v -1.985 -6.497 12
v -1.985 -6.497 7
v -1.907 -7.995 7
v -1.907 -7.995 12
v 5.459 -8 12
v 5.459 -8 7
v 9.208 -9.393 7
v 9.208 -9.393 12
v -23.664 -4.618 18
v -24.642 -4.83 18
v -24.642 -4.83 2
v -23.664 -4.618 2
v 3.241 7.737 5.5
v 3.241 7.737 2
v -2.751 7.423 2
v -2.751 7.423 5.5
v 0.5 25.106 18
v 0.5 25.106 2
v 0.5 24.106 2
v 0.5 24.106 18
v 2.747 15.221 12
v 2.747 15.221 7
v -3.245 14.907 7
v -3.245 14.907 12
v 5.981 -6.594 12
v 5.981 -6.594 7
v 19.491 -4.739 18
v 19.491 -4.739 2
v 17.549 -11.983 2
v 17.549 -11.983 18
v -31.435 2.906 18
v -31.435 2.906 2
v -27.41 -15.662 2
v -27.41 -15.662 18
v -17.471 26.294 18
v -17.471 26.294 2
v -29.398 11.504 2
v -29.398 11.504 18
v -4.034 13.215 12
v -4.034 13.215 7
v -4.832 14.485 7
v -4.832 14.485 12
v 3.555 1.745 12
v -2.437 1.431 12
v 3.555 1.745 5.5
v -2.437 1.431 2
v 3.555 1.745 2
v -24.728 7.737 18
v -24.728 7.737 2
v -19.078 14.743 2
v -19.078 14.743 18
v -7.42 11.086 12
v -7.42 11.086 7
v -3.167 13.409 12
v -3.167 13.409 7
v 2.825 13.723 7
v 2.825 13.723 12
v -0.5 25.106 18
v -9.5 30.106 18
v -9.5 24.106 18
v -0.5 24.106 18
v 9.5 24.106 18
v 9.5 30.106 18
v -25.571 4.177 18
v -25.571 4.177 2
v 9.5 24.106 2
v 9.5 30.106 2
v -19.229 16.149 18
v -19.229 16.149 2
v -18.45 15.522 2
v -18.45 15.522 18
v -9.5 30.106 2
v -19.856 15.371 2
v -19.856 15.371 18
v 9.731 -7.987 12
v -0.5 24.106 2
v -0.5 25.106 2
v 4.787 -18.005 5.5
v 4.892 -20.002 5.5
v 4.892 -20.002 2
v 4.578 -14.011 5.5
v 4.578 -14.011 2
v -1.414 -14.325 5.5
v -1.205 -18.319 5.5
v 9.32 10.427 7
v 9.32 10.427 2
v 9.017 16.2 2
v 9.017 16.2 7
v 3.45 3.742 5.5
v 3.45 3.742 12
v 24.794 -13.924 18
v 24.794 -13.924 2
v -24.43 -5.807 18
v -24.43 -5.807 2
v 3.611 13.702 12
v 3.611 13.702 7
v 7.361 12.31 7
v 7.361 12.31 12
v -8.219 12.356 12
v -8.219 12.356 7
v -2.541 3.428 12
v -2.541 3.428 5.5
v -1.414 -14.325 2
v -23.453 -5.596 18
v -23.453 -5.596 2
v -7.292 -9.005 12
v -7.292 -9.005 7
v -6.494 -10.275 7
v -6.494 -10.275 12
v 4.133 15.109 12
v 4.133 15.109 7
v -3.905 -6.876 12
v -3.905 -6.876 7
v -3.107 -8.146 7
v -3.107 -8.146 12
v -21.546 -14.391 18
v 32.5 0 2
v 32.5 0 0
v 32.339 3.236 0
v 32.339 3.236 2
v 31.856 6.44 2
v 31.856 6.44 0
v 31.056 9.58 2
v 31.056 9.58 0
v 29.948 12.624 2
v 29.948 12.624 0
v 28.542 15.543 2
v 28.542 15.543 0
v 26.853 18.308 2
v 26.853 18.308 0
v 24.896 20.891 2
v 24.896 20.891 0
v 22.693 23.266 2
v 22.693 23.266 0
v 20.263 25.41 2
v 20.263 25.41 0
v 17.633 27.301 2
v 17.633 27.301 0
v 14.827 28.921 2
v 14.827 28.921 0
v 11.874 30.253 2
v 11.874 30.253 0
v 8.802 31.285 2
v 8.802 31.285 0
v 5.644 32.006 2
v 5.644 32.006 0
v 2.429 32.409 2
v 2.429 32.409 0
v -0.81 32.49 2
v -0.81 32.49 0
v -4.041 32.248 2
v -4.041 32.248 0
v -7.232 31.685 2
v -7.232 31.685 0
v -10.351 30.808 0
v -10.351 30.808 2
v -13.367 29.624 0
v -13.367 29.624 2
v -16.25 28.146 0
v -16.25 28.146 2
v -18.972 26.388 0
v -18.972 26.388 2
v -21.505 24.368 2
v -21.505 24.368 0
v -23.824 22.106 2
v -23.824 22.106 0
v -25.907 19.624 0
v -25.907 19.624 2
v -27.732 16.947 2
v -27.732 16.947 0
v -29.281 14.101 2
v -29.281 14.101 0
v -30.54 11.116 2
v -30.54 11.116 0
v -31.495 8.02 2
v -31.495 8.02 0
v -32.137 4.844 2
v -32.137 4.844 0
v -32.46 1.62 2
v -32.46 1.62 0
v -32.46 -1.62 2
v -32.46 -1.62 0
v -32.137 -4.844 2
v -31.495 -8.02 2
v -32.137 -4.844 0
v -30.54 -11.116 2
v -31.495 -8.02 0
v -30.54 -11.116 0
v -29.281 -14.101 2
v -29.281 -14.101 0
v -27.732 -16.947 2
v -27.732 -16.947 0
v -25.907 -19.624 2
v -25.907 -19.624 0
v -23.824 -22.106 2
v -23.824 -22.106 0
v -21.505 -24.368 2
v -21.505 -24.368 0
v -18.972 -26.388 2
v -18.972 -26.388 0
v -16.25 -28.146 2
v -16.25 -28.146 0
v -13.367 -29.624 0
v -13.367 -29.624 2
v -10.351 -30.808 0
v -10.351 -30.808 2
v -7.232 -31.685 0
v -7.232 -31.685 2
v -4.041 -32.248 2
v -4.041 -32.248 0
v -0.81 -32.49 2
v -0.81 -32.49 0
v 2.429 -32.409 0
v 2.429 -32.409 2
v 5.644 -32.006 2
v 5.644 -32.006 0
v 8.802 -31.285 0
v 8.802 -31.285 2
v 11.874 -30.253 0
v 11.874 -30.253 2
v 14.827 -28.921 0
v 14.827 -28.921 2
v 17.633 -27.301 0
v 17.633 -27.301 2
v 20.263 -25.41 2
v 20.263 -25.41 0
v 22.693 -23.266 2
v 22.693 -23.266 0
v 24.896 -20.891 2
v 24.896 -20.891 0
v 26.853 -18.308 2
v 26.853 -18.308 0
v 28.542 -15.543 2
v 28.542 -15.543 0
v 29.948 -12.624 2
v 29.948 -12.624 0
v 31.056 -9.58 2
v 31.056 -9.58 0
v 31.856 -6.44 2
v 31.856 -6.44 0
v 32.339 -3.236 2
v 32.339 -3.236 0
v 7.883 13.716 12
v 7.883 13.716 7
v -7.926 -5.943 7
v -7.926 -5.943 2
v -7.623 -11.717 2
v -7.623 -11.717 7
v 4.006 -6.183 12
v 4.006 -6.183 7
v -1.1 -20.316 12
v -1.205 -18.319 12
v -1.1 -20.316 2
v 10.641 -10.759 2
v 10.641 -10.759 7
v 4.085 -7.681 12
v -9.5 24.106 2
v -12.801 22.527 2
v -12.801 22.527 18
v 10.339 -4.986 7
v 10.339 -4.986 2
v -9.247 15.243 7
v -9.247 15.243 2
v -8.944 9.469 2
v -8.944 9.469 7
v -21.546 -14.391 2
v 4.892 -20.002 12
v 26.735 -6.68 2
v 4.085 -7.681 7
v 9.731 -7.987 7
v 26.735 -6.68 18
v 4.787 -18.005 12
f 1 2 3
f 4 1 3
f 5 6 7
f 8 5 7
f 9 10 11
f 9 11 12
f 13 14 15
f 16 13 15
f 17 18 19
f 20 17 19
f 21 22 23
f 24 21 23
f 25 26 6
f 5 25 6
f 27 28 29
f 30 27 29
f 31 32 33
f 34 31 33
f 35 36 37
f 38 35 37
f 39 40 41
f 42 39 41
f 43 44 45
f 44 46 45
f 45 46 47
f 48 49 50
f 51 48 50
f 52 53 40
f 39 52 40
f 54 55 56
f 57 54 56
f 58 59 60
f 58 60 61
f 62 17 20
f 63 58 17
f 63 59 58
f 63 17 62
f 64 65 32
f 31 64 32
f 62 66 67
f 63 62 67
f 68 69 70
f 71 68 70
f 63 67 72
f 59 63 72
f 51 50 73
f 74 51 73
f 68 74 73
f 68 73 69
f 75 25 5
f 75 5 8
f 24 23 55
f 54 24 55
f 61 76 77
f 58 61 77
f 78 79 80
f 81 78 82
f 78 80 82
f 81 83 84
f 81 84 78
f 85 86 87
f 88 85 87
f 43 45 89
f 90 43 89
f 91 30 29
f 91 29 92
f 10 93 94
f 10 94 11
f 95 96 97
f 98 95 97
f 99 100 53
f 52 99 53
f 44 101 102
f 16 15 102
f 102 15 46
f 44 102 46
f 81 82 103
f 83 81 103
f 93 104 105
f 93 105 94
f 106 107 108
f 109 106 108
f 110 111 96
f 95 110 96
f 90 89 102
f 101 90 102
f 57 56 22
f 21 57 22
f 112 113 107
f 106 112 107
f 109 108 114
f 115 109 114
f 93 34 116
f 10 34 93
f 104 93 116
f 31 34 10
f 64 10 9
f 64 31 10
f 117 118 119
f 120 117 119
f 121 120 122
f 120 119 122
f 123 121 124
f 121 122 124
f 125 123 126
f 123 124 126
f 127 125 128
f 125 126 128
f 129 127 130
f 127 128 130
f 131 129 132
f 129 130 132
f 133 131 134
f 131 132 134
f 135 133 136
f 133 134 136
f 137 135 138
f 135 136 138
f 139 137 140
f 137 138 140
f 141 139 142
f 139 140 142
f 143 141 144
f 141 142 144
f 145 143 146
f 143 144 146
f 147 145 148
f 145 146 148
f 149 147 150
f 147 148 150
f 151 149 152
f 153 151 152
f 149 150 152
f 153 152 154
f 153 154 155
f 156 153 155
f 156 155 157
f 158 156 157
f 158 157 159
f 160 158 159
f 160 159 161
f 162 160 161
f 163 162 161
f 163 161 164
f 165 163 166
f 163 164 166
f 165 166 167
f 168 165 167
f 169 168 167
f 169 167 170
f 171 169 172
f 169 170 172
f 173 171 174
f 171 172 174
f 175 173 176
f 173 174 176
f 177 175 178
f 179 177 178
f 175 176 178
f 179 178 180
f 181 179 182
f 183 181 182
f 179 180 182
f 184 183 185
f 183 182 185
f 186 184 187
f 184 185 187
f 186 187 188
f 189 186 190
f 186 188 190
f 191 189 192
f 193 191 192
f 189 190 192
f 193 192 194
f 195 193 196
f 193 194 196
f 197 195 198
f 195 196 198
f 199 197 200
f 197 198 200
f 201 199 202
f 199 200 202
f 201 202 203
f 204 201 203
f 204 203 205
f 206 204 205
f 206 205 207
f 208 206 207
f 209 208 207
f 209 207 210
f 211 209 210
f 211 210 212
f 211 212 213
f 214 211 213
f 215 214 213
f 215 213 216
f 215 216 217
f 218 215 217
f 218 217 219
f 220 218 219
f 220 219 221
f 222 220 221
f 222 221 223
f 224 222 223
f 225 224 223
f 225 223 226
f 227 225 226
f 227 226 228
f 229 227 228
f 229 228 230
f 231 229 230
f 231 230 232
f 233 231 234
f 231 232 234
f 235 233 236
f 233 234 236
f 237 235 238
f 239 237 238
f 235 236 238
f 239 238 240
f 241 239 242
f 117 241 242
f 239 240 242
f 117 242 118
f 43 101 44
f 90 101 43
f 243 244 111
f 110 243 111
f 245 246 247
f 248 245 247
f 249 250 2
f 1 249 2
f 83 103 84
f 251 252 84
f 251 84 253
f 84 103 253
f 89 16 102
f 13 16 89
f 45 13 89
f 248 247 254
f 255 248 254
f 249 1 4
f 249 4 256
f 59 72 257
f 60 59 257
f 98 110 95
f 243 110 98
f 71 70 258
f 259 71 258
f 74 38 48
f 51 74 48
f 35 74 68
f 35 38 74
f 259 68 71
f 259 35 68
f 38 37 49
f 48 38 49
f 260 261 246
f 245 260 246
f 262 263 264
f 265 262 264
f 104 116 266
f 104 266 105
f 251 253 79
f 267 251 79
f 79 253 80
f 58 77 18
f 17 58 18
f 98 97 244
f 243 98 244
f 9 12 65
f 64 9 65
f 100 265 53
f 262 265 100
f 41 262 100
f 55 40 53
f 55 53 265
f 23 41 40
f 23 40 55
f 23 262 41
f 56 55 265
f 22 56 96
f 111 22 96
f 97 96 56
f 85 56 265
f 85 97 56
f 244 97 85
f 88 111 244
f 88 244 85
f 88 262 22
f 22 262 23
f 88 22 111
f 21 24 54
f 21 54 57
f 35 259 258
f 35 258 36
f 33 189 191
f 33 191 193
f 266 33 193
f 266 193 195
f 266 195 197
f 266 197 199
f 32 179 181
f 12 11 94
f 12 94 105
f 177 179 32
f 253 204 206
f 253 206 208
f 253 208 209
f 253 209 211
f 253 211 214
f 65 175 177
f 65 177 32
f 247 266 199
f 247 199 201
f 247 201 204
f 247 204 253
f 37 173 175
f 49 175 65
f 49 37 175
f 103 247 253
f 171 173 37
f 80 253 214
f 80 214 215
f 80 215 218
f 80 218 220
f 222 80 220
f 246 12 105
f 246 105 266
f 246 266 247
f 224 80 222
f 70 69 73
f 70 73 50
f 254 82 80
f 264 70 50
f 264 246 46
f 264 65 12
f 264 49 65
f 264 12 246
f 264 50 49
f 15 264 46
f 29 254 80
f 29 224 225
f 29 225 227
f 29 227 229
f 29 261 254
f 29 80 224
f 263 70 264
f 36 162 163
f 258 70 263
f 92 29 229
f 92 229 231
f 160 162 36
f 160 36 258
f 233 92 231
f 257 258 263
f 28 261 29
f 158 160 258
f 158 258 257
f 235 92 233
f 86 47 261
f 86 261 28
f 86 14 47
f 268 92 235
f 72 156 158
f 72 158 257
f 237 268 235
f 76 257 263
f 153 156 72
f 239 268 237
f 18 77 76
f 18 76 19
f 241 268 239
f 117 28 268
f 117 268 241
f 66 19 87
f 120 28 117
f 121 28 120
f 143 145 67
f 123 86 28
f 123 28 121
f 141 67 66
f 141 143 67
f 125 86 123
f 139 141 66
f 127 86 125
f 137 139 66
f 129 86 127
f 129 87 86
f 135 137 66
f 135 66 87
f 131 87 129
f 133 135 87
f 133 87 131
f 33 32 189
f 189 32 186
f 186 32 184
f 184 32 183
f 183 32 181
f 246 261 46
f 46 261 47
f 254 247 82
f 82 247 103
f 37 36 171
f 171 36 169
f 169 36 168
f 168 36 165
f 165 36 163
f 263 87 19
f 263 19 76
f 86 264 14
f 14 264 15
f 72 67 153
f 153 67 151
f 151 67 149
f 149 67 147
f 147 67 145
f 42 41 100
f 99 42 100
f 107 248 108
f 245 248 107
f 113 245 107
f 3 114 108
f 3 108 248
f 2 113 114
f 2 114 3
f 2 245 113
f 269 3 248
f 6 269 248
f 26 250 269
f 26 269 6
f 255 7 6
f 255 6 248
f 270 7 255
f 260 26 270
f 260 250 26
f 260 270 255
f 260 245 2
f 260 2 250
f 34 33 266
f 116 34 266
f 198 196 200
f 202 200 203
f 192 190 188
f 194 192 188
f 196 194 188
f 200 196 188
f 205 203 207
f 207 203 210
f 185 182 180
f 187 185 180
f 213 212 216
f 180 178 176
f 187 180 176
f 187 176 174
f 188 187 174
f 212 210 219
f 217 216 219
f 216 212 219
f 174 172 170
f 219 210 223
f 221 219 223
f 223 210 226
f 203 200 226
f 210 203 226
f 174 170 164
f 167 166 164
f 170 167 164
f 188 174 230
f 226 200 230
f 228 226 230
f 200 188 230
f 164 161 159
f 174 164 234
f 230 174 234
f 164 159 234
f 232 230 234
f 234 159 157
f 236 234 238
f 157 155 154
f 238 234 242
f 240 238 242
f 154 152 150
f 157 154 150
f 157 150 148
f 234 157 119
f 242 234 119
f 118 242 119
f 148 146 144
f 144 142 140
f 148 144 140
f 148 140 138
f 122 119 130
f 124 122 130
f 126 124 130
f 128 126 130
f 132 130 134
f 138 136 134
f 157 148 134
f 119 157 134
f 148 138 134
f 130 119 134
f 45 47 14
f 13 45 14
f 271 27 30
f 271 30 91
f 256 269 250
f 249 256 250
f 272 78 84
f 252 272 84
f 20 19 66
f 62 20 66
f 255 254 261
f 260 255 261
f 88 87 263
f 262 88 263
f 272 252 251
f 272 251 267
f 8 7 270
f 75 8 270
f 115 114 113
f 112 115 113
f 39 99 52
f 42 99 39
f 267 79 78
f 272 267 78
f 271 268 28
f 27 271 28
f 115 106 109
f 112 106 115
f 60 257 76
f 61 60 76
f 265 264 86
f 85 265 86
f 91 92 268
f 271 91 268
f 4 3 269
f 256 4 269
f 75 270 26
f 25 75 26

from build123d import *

# Parameters (mm, degrees)
F0_R      = 32.5
F1_DEPTH  = 2
F3_DEPTH  = 16
F5_DEPTH  = 5
F8_DEPTH  = 3.5
F10_DEPTH = 6.5
F12_DEPTH = 5


with BuildPart() as f1:
    # F0 (on Top) → F1 (new body)
    with BuildSketch(Plane.XY):
        Circle(F0_R)
    extrude(amount=F1_DEPTH)

    # F2 (on face) → F3 (join)
    with BuildSketch(Plane.XY.offset(2)):
        Polygon((-17.470987, 26.293807), (-29.398278, 11.503954), (-24.727798, 7.737442), (-19.078029, 14.743161), (-19.856442, 15.370914), (-19.22869, 16.149327), (-18.450276, 15.521575), (-12.800507, 22.527294), align=None)
        Polygon((9.5, 30.105642), (-9.5, 30.105642), (-9.5, 24.105642), (-0.5, 24.105642), (-0.5, 25.105642), (0.5, 25.105642), (0.5, 24.105642), (9.5, 24.105642), align=None)
        Polygon((-31.434899, 2.906345), (-27.409662, -15.662378), (-21.545855, -14.391251), (-23.452546, -5.59554), (-24.429847, -5.807395), (-24.641702, -4.830094), (-23.664401, -4.618239), (-25.571091, 4.177472), align=None)
        Polygon((26.734962, -6.679754), (19.490518, -4.738611), (17.549375, -11.983055), (24.793819, -13.924198), align=None)
    extrude(amount=F3_DEPTH)

    # F4 (on face) → F5 (join)
    with BuildSketch(Plane.XY.offset(2)):
        Polygon((10.338692, -4.986162), (-7.925741, -5.943361), (-7.623178, -11.7166), (10.641255, -10.759402), align=None)
        Polygon((9.017375, 16.199804), (-9.247058, 15.242605), (-8.944496, 9.469366), (9.319937, 10.426564), align=None)
    extrude(amount=F5_DEPTH)

    # F7 (on face) → F8 (join)
    with BuildSketch(Plane.XY.offset(2)):
        Polygon((3.241127, 7.73687), (-2.750651, 7.422854), (-2.436635, 1.431077), (3.555142, 1.745093), align=None)
        Polygon((4.577761, -14.010625), (-1.414016, -14.324641), (-1.1, -20.316418), (4.891777, -20.002403), align=None)
    extrude(amount=F8_DEPTH)

    # F9 (on face) → F10 (join)
    with BuildSketch(Plane.XY.offset(5.5)):
        Polygon((3.45047, 3.742352), (-2.541307, 3.428336), (-2.436635, 1.431077), (3.555142, 1.745093), align=None)
        Polygon((4.787105, -18.005143), (-1.204672, -18.319159), (-1.1, -20.316418), (4.891777, -20.002403), align=None)
    extrude(amount=F10_DEPTH)

    # F11 (on face) → F12 (join)
    with BuildSketch(Plane.XY.offset(7)):
        Polygon((-3.905181, -6.876087), (-7.291749, -9.004739), (-6.493505, -10.274702), (-3.106937, -8.14605), align=None)
        Polygon((4.006315, -6.182721), (-1.985463, -6.496736), (-1.906959, -7.994681), (4.084819, -7.680665), align=None)
        Polygon((9.730671, -7.986948), (5.980971, -6.594201), (5.458691, -8.000339), (9.208391, -9.393086), align=None)
        Polygon((-4.832129, 14.484637), (-8.218697, 12.355986), (-7.420453, 11.086022), (-4.033884, 13.214674), align=None)
        Polygon((2.746676, 15.221225), (-3.245101, 14.907209), (-3.166597, 13.409265), (2.82518, 13.72328), align=None)
        Polygon((7.883003, 13.715759), (4.133302, 15.108505), (3.611022, 13.702367), (7.360723, 12.309621), align=None)
    extrude(amount=F12_DEPTH)


solid = f1.part
